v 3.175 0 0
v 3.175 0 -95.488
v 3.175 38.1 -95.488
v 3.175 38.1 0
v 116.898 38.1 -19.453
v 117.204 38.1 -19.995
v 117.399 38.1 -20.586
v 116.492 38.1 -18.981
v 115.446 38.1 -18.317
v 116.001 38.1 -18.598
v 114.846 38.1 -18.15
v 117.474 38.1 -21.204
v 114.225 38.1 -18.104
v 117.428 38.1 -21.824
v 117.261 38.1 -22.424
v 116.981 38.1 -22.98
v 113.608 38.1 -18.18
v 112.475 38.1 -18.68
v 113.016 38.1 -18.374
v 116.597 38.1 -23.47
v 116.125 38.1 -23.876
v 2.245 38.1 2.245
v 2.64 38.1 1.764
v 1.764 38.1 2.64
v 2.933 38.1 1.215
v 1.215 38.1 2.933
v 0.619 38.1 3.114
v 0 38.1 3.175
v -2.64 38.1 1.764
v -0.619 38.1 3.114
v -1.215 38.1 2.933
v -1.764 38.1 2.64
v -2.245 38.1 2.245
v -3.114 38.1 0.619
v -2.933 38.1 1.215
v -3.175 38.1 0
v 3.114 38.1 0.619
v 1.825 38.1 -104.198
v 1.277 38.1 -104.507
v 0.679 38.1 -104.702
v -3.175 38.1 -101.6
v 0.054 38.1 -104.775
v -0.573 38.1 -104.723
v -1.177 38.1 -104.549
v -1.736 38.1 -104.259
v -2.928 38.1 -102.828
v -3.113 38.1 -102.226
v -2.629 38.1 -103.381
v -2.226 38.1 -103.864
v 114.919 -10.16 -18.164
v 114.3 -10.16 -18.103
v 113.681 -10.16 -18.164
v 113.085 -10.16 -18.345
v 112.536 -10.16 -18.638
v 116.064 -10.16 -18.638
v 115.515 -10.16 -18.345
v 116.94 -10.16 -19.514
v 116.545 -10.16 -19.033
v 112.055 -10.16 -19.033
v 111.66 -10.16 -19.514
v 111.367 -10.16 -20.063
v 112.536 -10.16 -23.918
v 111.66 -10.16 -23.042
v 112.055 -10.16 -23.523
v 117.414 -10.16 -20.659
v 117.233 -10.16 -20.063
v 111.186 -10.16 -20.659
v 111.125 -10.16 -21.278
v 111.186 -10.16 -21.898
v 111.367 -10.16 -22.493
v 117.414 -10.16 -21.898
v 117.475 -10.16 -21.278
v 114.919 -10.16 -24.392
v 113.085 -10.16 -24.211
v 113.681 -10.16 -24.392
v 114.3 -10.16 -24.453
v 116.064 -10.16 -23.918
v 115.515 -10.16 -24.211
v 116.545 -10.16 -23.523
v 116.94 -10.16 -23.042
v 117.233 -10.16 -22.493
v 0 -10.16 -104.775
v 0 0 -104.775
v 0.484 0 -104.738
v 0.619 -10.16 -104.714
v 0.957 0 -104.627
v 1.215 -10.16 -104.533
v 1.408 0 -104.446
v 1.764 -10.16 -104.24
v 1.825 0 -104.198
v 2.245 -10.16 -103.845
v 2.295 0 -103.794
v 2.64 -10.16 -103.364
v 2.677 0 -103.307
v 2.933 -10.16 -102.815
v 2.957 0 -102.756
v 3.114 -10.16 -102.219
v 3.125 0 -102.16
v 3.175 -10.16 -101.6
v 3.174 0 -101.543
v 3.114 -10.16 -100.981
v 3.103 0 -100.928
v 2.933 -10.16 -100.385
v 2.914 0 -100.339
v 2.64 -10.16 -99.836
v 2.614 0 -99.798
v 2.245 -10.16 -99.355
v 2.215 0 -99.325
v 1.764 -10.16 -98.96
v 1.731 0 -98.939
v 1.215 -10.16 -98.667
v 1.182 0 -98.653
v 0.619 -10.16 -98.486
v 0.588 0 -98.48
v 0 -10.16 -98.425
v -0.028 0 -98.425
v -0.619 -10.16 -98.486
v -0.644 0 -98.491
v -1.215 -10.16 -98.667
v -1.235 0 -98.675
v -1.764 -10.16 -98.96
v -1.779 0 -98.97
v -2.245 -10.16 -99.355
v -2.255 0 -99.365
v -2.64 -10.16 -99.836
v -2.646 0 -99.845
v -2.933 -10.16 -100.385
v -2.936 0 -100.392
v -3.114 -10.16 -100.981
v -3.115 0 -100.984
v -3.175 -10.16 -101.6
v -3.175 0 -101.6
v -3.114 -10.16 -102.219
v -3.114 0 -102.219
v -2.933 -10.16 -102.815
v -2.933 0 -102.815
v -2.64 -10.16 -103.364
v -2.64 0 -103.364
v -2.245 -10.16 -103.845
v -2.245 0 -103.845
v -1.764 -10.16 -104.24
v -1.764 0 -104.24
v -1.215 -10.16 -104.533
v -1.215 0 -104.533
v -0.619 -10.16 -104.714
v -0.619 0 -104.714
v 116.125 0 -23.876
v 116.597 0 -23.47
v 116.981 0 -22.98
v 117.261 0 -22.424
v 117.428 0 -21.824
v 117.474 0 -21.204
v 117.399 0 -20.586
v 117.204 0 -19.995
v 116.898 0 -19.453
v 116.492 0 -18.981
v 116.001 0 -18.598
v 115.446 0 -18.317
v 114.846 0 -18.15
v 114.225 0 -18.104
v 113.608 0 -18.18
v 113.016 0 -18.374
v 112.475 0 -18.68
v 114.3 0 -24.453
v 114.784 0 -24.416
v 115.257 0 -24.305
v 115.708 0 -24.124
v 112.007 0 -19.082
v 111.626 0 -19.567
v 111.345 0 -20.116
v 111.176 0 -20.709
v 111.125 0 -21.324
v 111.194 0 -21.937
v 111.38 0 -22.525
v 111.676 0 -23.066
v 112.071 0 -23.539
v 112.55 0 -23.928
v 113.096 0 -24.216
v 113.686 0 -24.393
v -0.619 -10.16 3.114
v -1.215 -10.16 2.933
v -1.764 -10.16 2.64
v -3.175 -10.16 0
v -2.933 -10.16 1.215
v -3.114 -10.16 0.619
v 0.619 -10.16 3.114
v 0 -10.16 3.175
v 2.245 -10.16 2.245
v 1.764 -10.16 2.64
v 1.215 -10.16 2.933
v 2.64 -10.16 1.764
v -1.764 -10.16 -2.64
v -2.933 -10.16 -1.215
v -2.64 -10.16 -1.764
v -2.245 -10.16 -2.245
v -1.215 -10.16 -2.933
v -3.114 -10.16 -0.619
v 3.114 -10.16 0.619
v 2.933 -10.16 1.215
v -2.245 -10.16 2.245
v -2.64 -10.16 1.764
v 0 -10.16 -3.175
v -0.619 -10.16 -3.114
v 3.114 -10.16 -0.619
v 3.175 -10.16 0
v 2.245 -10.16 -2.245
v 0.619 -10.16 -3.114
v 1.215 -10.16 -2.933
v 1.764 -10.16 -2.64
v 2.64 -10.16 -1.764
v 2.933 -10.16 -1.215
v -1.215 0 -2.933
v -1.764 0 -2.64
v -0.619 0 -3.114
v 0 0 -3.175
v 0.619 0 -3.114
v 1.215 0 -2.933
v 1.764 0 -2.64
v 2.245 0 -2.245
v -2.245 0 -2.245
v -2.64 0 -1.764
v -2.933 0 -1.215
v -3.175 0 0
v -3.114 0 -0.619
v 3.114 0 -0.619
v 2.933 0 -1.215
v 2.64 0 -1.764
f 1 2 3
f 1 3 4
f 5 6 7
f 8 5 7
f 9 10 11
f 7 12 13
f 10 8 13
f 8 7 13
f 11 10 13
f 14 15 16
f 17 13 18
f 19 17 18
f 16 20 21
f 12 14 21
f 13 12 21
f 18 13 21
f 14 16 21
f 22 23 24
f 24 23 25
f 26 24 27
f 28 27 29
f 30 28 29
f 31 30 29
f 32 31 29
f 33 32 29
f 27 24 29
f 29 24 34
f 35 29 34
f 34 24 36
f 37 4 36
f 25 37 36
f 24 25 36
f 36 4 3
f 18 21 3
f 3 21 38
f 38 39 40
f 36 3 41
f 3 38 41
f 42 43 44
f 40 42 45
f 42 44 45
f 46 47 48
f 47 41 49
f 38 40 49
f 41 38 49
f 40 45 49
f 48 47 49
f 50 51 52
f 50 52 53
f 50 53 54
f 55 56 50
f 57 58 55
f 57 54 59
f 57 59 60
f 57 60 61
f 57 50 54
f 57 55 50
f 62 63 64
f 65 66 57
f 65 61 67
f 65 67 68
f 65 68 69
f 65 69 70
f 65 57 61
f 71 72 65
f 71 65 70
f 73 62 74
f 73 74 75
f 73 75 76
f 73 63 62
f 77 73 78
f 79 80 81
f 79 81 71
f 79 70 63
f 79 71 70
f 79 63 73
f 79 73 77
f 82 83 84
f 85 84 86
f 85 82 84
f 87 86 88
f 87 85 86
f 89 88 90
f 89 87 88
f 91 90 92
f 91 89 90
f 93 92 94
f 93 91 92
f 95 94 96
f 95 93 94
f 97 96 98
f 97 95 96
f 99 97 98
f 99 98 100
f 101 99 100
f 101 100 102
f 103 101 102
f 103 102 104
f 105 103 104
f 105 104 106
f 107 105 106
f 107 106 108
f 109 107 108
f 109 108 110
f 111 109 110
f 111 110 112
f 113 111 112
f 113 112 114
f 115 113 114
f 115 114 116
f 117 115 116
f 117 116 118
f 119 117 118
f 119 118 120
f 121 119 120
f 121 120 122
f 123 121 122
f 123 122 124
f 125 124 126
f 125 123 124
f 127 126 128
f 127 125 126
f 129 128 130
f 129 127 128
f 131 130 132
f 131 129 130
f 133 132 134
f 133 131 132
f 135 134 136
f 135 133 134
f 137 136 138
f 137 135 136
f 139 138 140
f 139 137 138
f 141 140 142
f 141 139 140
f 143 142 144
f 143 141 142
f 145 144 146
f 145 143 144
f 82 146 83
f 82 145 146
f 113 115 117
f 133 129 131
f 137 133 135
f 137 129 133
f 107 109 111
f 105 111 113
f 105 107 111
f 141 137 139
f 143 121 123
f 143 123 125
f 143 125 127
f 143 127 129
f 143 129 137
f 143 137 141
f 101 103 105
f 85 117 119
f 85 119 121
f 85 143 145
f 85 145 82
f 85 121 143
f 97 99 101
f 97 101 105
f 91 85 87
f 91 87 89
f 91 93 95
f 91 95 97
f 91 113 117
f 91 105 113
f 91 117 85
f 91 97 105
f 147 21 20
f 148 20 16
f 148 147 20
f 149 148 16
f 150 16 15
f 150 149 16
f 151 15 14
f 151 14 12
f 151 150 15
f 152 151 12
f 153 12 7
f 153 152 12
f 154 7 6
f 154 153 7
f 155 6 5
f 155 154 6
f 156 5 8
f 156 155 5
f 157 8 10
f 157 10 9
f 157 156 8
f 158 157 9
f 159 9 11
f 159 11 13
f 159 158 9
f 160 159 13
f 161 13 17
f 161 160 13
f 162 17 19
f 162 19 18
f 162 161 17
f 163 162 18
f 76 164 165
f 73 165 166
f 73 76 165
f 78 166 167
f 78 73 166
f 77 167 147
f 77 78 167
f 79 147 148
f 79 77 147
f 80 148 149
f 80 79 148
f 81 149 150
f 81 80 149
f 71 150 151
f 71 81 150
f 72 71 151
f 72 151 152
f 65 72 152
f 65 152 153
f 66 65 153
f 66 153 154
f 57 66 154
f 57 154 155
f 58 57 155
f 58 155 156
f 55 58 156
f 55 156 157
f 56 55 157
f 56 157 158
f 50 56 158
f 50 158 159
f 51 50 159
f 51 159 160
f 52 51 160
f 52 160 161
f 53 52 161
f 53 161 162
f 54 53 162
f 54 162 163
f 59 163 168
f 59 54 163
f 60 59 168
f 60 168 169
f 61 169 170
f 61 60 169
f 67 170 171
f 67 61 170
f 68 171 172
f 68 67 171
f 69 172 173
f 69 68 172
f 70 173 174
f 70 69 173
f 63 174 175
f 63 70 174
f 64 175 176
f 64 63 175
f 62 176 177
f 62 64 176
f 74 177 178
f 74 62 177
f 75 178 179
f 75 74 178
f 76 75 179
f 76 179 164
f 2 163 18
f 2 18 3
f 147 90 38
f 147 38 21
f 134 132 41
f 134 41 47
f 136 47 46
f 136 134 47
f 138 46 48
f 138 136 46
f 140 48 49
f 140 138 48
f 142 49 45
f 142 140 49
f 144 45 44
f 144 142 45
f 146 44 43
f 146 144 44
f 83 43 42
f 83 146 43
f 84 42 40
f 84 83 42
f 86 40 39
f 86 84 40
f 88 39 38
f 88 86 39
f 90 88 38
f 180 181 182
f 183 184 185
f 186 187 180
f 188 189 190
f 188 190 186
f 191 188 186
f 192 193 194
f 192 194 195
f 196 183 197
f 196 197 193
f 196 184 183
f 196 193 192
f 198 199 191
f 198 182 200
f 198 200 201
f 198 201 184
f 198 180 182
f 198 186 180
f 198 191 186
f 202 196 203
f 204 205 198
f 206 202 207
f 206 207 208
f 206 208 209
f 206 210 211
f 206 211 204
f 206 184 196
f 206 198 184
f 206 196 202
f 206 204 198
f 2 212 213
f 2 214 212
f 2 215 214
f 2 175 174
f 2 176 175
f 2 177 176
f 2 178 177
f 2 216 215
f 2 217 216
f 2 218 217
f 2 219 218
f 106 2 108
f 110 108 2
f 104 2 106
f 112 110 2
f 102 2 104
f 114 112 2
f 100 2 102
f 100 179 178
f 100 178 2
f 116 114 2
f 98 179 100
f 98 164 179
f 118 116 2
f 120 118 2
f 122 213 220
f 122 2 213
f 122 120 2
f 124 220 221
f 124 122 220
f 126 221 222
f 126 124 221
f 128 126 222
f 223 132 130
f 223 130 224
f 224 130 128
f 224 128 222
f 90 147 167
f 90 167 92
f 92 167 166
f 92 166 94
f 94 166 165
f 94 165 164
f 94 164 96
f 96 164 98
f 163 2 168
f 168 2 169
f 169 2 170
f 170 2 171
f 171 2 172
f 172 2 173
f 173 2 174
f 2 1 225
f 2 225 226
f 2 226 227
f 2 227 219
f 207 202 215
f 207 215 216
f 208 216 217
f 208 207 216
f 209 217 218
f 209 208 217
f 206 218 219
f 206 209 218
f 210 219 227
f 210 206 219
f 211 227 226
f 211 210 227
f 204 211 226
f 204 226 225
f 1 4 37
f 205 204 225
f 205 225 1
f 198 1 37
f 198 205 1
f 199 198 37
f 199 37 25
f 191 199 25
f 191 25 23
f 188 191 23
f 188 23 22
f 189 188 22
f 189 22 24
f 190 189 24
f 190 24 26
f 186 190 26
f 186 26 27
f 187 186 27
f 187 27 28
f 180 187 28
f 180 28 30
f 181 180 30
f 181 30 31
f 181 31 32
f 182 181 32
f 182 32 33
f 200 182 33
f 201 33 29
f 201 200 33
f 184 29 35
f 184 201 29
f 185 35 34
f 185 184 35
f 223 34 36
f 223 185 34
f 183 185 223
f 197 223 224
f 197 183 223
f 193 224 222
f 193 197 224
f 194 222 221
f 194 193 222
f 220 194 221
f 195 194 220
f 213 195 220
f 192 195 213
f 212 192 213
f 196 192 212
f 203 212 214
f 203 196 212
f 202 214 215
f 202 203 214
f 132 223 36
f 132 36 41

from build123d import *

# Parameters (mm, degrees)
BOSS_EXTRUDE1_DEPTH = 38.1
BOSS_EXTRUDE2_START = 10.16
SKETCH2_R           = 3.175
BOSS_EXTRUDE2_DEPTH = 10.16


with BuildPart() as part:
    # Sketch1 → Boss-Extrude1 (new body)
    with BuildSketch(Plane(origin=(0, 0, 0), x_dir=(1, 0, 0), z_dir=(0, 1, 0))):
        with BuildLine():
            Line((-3.175, 0), (-3.175, 101.6))
            ThreePointArc((-3.175, 101.6), (-1.463672289, 104.417496838), (1.825496649, 104.197727273))
            Line((1.825496649, 104.197727273), (116.125496649, 23.875874704))
            ThreePointArc((116.125496649, 23.875874704), (116.897727273, 19.452650782), (112.474503351, 18.680420159))
            Line((112.474503351, 18.680420159), (3.175, 95.488281873))
            Line((3.175, 95.488281873), (3.175, 0))
            ThreePointArc((3.175, 0), (0, -3.175), (-3.175, 0))
        make_face()
    extrude(amount=BOSS_EXTRUDE1_DEPTH)

    # Sketch2 → Boss-Extrude2 (add)
    with BuildSketch(Plane(origin=(0, 0, 0), x_dir=(-1, 0, 0), z_dir=(0, -1, 0)).offset(BOSS_EXTRUDE2_START)):
        with Locations(Location((0, 0, 0), (0, 0, 90))):
            Circle(SKETCH2_R)
        with Locations(Location((0, 101.6, 0), (0, 0, 90))):
            Circle(SKETCH2_R)
        with Locations(Location((-114.3, 21.278147432, 0), (0, 0, 90))):
            Circle(SKETCH2_R)
    extrude(amount=-BOSS_EXTRUDE2_DEPTH)


solid = part.part
